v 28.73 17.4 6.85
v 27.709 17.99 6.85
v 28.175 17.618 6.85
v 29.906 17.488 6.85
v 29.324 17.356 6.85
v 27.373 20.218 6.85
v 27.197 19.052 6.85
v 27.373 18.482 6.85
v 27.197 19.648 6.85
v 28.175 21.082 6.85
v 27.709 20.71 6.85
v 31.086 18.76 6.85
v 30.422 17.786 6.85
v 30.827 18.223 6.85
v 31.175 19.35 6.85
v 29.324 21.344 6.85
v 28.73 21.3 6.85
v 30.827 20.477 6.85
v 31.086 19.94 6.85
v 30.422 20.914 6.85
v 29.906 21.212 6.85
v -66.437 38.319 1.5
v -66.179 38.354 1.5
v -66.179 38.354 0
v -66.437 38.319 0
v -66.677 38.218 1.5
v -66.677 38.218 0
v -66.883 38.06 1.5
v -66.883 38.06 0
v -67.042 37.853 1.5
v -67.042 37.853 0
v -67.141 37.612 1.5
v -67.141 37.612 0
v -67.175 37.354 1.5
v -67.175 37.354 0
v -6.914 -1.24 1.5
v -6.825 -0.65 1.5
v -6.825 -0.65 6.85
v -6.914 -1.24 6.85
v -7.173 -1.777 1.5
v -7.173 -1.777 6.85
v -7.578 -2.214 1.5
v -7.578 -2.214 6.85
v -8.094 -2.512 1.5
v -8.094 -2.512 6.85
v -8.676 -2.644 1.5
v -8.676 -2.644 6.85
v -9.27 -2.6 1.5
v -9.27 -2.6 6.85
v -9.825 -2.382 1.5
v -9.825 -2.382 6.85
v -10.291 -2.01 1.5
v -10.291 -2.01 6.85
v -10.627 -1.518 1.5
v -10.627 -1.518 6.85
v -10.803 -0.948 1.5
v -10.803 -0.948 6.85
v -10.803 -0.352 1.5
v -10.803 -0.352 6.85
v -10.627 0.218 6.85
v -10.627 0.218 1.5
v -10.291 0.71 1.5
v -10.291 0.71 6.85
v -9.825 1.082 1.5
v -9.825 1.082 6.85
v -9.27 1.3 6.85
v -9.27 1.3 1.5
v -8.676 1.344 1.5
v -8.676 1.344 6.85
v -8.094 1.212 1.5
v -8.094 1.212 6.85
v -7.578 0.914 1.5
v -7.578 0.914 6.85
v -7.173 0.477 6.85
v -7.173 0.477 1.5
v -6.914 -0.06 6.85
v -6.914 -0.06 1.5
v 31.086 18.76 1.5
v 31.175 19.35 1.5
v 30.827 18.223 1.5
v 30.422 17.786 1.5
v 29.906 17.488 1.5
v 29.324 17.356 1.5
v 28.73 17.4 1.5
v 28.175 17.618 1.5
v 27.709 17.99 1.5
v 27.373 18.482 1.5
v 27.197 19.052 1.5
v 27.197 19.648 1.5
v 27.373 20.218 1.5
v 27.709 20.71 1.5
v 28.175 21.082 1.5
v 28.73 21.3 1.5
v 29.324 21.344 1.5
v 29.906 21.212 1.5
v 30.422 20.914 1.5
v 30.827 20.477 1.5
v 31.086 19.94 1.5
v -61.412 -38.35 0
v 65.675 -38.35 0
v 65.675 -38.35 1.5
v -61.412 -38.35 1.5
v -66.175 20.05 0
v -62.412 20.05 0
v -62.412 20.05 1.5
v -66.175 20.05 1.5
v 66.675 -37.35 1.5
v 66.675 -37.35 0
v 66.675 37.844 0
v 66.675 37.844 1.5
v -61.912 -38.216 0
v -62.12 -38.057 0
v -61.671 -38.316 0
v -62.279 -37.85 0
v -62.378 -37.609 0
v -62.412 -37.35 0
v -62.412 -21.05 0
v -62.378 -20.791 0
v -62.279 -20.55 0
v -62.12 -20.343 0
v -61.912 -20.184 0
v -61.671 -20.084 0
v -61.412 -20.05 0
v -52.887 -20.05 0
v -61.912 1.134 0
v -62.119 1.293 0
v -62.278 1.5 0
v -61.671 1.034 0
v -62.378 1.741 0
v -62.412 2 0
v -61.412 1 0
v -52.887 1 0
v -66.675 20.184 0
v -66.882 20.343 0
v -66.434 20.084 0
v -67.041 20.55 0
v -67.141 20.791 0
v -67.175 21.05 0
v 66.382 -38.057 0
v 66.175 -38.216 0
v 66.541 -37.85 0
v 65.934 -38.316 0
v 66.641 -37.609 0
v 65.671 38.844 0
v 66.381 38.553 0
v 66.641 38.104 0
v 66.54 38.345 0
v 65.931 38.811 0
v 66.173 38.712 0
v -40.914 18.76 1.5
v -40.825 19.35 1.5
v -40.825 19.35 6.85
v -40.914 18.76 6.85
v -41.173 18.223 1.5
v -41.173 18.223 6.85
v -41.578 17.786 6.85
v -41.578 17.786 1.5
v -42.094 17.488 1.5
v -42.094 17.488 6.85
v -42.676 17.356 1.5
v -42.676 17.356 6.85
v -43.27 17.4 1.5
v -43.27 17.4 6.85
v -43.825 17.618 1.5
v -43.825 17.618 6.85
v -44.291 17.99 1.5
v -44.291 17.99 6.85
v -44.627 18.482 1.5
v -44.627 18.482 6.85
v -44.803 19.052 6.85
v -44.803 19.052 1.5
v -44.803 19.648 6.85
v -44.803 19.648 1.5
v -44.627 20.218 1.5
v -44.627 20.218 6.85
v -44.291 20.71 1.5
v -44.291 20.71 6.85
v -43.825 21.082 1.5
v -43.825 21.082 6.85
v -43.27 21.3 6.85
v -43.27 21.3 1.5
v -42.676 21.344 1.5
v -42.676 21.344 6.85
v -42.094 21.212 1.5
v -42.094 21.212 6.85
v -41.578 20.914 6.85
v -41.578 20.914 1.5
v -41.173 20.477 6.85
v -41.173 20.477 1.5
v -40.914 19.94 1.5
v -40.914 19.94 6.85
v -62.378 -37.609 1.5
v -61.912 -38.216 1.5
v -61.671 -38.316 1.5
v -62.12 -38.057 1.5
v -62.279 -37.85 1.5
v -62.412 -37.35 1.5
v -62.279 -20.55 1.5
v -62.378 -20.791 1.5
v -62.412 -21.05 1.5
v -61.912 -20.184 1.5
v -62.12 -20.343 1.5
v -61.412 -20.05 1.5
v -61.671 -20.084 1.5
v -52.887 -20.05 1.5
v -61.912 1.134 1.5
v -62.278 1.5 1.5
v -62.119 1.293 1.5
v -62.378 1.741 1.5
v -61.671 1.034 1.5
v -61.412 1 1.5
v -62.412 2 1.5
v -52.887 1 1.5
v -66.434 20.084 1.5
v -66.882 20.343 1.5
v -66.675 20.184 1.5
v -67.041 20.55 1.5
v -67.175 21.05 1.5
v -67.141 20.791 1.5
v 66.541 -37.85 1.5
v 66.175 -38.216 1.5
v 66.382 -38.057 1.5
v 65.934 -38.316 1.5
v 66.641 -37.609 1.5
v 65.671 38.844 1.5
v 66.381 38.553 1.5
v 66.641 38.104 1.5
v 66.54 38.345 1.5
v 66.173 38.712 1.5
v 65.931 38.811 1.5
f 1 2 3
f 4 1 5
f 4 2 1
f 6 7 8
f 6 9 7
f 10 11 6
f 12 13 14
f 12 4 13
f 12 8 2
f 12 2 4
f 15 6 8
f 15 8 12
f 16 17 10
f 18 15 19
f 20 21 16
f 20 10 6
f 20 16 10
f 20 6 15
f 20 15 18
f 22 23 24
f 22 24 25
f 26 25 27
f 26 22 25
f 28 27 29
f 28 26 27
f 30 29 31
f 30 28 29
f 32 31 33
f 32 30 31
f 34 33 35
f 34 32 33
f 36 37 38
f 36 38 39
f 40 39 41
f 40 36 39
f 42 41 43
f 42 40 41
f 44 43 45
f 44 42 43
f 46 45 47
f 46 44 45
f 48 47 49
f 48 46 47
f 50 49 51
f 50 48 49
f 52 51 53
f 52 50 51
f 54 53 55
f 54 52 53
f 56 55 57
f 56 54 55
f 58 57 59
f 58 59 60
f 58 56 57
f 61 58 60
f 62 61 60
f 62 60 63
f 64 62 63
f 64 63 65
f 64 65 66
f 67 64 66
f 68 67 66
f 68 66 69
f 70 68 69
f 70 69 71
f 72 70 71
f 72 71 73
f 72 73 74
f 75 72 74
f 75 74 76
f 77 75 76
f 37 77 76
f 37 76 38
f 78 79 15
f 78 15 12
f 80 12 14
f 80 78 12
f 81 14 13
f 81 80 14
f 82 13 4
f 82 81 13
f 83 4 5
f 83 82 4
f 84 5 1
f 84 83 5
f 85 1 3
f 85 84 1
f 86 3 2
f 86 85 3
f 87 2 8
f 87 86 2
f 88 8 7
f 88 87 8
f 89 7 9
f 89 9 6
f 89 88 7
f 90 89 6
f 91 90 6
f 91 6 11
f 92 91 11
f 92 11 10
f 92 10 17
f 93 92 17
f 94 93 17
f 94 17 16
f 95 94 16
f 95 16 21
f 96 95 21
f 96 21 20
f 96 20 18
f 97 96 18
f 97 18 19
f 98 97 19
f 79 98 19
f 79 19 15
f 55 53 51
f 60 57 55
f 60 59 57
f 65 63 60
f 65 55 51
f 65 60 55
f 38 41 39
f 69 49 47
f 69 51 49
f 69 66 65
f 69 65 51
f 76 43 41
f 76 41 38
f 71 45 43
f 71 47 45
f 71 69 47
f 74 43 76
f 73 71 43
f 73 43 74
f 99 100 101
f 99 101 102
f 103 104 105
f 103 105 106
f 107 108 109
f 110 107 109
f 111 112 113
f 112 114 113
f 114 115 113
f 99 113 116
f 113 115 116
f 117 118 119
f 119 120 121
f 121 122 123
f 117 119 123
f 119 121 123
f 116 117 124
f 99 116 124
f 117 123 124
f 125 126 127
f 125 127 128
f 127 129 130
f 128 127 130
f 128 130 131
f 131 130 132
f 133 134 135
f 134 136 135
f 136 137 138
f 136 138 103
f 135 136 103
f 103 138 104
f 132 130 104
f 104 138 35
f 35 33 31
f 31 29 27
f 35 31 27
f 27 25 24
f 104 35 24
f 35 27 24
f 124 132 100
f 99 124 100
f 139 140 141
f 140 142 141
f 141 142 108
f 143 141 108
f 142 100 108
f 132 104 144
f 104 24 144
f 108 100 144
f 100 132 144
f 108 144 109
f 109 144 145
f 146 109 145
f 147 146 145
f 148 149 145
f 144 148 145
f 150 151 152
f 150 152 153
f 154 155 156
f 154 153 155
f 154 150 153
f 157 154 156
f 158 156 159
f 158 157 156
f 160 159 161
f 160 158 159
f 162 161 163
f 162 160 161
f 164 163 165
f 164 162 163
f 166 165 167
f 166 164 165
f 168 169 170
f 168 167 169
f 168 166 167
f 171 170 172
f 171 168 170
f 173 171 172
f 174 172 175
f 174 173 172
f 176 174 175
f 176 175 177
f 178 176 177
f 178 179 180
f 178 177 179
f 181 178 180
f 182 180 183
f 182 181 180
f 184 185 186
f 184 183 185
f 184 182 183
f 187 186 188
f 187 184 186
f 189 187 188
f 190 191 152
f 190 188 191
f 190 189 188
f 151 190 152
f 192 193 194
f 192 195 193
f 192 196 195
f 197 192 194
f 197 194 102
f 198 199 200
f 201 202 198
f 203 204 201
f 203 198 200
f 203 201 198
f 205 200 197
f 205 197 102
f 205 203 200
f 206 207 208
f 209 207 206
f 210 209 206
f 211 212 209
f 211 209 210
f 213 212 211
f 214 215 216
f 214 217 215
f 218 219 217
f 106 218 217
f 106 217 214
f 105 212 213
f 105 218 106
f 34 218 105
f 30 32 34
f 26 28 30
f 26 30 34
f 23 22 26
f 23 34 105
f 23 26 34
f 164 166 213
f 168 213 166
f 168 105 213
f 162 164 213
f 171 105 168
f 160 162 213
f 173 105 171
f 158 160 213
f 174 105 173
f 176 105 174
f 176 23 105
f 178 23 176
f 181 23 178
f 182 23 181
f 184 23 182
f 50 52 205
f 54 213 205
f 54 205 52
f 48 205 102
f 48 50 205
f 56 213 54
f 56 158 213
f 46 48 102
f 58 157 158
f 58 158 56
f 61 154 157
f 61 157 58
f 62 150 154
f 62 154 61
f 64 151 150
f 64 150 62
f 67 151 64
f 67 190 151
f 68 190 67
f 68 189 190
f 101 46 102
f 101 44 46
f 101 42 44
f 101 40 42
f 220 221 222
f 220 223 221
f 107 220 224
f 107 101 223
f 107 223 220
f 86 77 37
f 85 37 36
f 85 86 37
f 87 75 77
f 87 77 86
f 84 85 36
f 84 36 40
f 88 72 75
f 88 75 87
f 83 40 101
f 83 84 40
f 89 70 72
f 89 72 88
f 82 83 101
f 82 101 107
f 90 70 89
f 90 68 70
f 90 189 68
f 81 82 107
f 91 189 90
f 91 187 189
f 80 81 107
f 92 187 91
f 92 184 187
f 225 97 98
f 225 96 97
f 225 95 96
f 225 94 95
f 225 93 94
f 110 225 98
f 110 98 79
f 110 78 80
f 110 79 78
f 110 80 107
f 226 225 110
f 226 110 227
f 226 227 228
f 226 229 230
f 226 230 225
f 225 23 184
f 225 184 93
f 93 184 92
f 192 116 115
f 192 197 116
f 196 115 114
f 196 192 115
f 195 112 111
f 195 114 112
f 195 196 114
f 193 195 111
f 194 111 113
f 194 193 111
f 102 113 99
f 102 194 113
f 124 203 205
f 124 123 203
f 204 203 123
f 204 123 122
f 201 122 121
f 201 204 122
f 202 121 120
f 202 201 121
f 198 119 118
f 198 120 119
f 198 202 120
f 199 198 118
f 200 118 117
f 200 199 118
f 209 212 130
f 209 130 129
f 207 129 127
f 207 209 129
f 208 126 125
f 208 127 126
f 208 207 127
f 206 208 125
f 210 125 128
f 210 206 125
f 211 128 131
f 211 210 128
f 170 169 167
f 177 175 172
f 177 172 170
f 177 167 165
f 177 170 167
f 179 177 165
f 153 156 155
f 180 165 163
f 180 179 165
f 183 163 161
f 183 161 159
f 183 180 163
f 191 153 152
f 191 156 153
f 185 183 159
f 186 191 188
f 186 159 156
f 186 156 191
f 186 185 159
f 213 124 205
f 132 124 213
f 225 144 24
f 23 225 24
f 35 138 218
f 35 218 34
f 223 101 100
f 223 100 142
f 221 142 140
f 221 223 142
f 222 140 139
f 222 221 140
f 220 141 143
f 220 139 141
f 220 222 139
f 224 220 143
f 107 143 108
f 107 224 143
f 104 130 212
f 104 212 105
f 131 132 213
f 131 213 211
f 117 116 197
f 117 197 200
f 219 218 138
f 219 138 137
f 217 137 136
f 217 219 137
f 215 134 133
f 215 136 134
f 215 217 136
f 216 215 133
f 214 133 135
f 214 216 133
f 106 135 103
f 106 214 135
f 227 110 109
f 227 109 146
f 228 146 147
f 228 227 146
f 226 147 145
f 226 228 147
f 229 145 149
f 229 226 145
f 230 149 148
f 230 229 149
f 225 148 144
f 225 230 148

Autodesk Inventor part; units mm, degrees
ref_plane "YZ Plane" through (0, 0, 0) normal (1, 0, 0) x (0, 1, 0)
ref_plane "XZ Plane" through (0, 0, 0) normal (0, 1, 0) x (-1, 0, 0)
ref_plane "XY Plane" through (0, 0, 0) normal (0, 0, 1) x (1, 0, 0)
sketch "Sketch1" plane through (0, 0, 0) normal (0, 0, 1) x (1, 0, 0)
  line L0 (67.175, 38.35) -> (67.175, 15.986) projected
  arc A0 (67.175, 38.35) -> (66.175, 39.35) centre (66.175, 38.35) ccw projected
  line L1 (-33.175, 39.35) -> (66.175, 39.35) projected
  arc A1 (-34.175, 40.35) -> (-33.175, 39.35) centre (-33.175, 40.35) ccw projected
  line L2 (-34.175, 40.35) -> (-34.175, 43.6) projected
  line L3 (-34.175, 43.6) -> (-34.5505, 43.6) projected
  spline S0 degree 3 poles (-35.175, 43.605) (-35.038, 43.605) (-34.8736, 43.6028) (-34.6784, 43.6006) (-34.6086, 43.6) (-34.5505, 43.6) knots 0.473314 0.473314 0.473314 0.473314 0.514423 0.514423 0.531864 0.531864 0.531864 0.531864 projected
  line L4 (-51.175, 43.605) -> (-35.175, 43.605) projected
  spline S1 degree 3 poles (-51.7995, 43.6) (-51.7414, 43.6) (-51.6716, 43.6006) (-51.4764, 43.6028) (-51.312, 43.605) (-51.175, 43.605) knots 0.531978 0.531978 0.531978 0.531978 0.549419 0.549419 0.590528 0.590528 0.590528 0.590528 projected
  line L5 (-51.7995, 43.6) -> (-52.175, 43.6) projected
  line L6 (-52.175, 43.6) -> (-52.175, 40.35) projected
  arc A2 (-53.175, 39.35) -> (-52.175, 40.35) centre (-53.175, 40.35) ccw projected
  line L7 (-67.175, 39.35) -> (-53.175, 39.35) projected
  line L8 (-67.175, 20.05) -> (-67.175, 39.35) projected
  line L9 (-62.412, 20.05) -> (-67.175, 20.05) projected
  line L10 (-62.412, 1) -> (-62.412, 20.05) projected
  line L11 (-52.887, 1) -> (-62.412, 1) projected
  line L12 (-52.887, -20.05) -> (-52.887, 1) projected
  line L13 (-62.4125, -20.05) -> (-52.887, -20.05) projected
  line L14 (-62.4125, -39.35) -> (-62.4125, -20.05) projected
  line L15 (66.175, -39.35) -> (-62.4125, -39.35) projected
  arc A3 (66.175, -39.35) -> (67.175, -38.35) centre (66.175, -38.35) ccw projected
  line L16 (67.175, 0.986) -> (67.175, -38.35) projected
  arc A4 (68.175, 1.986) -> (67.175, 0.986) centre (68.175, 0.986) ccw projected
  line L17 (68.175, 1.986) -> (71.425, 1.986) projected
  line L18 (71.425, 1.986) -> (71.425, 2.3615) projected
  spline S2 degree 3 poles (71.43, 2.986) (71.43, 2.849) (71.4278, 2.6846) (71.4256, 2.4894) (71.425, 2.4196) (71.425, 2.3615) knots 0.473429 0.473429 0.473429 0.473429 0.514537 0.514537 0.531978 0.531978 0.531978 0.531978 projected
  line L19 (71.43, 13.986) -> (71.43, 2.986) projected
  spline S3 degree 3 poles (71.425, 14.6105) (71.425, 14.5524) (71.4256, 14.4826) (71.4278, 14.2874) (71.43, 14.123) (71.43, 13.986) knots 0.531978 0.531978 0.531978 0.531978 0.549419 0.549419 0.590528 0.590528 0.590528 0.590528 projected
  line L20 (71.425, 14.6105) -> (71.425, 14.986) projected
  line L21 (71.425, 14.986) -> (68.175, 14.986) projected
  arc A5 (67.175, 15.986) -> (68.175, 14.986) centre (68.175, 15.986) ccw projected
  line L22 (-67.175, 39.35) -> (-67.175, 38.35)
  line L23 (-67.175, 39.35) -> (67.175, 39.35)
  line L24 (67.175, 39.35) -> (67.175, -39.35)
  line L25 (67.175, -39.35) -> (-67.175, -39.35)
  line L26 (-67.175, -39.35) -> (-67.175, 39.35)
  line L27 (67.175, -39.35) -> (67.175, -38.35)
  line L28 (67.175, -38.35) -> (-62.4125, -38.35)
  line L29 (67.175, 39.35) -> (67.175, 38.85)
  line L30 (67.175, 38.85) -> (-67.175, 38.35)
  line L31 (67.175, 39.35) -> (66.675, 39.35)
  line L32 (66.675, 39.35) -> (67.175, 39.35)
  line L33 (67.175, 39.35) -> (67.175, -39.35)
  line L34 (67.175, -39.35) -> (66.675, -39.35)
  line L35 (66.675, -39.35) -> (66.675, 39.35)
  point P0 (0, 0)
  point P1 (67.175, -38.35)
  point P2 (67.0413, 38.8495)
  point P3 (66.675, -38.35)
  point P4 (66.675, 38.8481)
  dimension "d0" = 1
  dimension "d1" = 1
  dimension "d2" = 0.5
  dimension "d16" = 0.5
extrude "Extrusion1" add sketch "Sketch1" along normal blind 1.5 contours L35 L28 L14 L13 L12 L11 L10 L9 L8 L30
fillet "Fillet1" radius 1 7 edges at (-67.175, 38.35, 0.75) (-67.175, 20.05, 0.75) (-62.412, 1, 0.75) (-62.4125, -20.05, 0.75) (-62.4125, -38.35, 0.75) (66.675, 38.8481, 0.75) (66.675, -38.35, 0.75)
sketch "Sketch2" plane through (0, 0, 1.5) normal (0, 0, 1) x (1, 0, 0)
  line L0 (65.6713, 38.8444) -> (-66.1787, 38.3537) projected
  arc A0 (-66.1787, 38.3537) -> (-67.175, 37.3537) centre (-66.175, 37.3537) ccw projected
  line L1 (-67.175, 37.3537) -> (-67.175, 21.05) projected
  arc A1 (-67.175, 21.05) -> (-66.175, 20.05) centre (-66.175, 21.05) ccw projected
  line L2 (-66.175, 20.05) -> (-62.412, 20.05) projected
  line L3 (-62.412, 20.05) -> (-62.412, 2) projected
  arc A2 (-62.412, 2) -> (-61.412, 1) centre (-61.412, 2) ccw projected
  line L4 (-61.412, 1) -> (-52.887, 1) projected
  line L5 (-52.887, 1) -> (-52.887, -20.05) projected
  line L6 (-52.887, -20.05) -> (-61.4125, -20.05) projected
  arc A3 (-61.4125, -20.05) -> (-62.4125, -21.05) centre (-61.4125, -21.05) ccw projected
  line L7 (-62.4125, -21.05) -> (-62.4125, -37.35) projected
  arc A4 (-62.4125, -37.35) -> (-61.4125, -38.35) centre (-61.4125, -37.35) ccw projected
  line L8 (-61.4125, -38.35) -> (65.675, -38.35) projected
  line L9 (67.175, 38.85) -> (67.175, 19.35)
  line L10 (67.175, 19.35) -> (29.175, 19.35)
  circle A5 centre (29.175, 19.35) radius 2
  line L11 (29.175, 19.35) -> (-42.825, 19.35)
  circle A6 centre (-42.825, 19.35) radius 2
  line L12 (29.175, 19.35) -> (-8.825, 19.35)
  line L13 (-8.825, 19.35) -> (-8.825, -0.65)
  circle A7 centre (-8.825, -0.65) radius 2
  line L14 (66.675, -37.35) -> (66.675, 37.8444) projected
  arc A8 (65.675, -38.35) -> (66.675, -37.35) centre (65.675, -37.35) ccw projected
  arc A9 (66.675, 37.8444) -> (65.6713, 38.8444) centre (65.675, 37.8444) ccw projected
  point P0 (0, 0)
  dimension "d6" = 19.5
  dimension "d7" = 38
  dimension "d8" = 4
  dimension "d9" = 72
  dimension "d10" = 4
  dimension "d11" = 38
  dimension "d12" = 20
  dimension "d13" = 4
extrude "Extrusion2" add sketch "Sketch2" along normal blind 5.35 contours A7 | A6 | A5 L11 L10 | L10 L11 A5
properties part number "BottomInner_right"
